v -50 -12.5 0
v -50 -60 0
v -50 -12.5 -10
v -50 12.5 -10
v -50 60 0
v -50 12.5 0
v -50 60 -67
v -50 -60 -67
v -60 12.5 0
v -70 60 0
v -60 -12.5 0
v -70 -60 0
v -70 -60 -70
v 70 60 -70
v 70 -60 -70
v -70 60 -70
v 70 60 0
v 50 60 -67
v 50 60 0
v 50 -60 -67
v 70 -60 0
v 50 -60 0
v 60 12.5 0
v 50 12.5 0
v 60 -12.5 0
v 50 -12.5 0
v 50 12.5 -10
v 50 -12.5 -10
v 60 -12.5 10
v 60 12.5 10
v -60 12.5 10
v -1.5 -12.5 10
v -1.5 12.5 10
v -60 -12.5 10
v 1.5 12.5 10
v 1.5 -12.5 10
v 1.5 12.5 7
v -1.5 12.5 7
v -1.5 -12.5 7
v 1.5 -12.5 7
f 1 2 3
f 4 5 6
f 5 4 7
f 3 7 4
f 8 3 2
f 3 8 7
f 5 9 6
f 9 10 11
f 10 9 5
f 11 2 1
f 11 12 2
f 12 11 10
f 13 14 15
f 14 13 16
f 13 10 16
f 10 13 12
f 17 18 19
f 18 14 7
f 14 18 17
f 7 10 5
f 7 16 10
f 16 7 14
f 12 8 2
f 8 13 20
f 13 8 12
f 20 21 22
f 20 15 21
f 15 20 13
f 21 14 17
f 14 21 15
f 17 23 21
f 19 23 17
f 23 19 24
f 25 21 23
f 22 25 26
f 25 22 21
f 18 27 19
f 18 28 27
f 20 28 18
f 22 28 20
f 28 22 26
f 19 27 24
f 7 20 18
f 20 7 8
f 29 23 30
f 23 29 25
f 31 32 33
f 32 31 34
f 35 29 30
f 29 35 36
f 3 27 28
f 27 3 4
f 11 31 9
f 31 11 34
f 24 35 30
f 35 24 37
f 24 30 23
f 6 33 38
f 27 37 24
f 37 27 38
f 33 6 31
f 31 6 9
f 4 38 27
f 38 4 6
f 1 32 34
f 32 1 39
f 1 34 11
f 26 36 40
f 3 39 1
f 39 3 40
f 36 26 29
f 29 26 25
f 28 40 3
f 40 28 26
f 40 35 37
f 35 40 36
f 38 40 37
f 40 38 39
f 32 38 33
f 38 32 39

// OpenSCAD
bridgeLength = 120;
bridgeSupportSize = 10;
weightAttachCutout = 3;
gapWidth = 100;

bridgeWidth = 25;

testingRig();
basicBridge();

module basicBridge() {
	translate([-bridgeLength/2, -bridgeWidth/2, -bridgeSupportSize]) {
		difference() {
			cube([bridgeLength, bridgeWidth, 20]);
			translate([bridgeLength-bridgeSupportSize, -1, -1]) cube([bridgeSupportSize+1, bridgeWidth+2, bridgeSupportSize+1]);
			translate([-1, -1, -1]) cube([bridgeSupportSize+1, bridgeWidth+2, bridgeSupportSize+1]);
			translate([bridgeLength/2, -bridgeWidth/2, 20]) weightCutout();
		}
	}
}

module weightCutout() {
	translate([-weightAttachCutout/2, bridgeWidth/2-1, -weightAttachCutout]) cube([weightAttachCutout, bridgeWidth+2, weightAttachCutout+1]);
}

module testingRig() {
	assign(width=120, general=20, height=70, base=3) 
	translate([0, 0, -height]) {
		color([0.8,0.5,0]) translate([-general-gapWidth/2, -width/2]) cube([general, width, height]);
		color([0.8,0.5,0]) translate([gapWidth/2, -width/2]) cube([general, width, height]);
		color([0.8,0.4,0]) translate([-gapWidth/2, -width/2]) cube([gapWidth, width, base]);
	}
}
